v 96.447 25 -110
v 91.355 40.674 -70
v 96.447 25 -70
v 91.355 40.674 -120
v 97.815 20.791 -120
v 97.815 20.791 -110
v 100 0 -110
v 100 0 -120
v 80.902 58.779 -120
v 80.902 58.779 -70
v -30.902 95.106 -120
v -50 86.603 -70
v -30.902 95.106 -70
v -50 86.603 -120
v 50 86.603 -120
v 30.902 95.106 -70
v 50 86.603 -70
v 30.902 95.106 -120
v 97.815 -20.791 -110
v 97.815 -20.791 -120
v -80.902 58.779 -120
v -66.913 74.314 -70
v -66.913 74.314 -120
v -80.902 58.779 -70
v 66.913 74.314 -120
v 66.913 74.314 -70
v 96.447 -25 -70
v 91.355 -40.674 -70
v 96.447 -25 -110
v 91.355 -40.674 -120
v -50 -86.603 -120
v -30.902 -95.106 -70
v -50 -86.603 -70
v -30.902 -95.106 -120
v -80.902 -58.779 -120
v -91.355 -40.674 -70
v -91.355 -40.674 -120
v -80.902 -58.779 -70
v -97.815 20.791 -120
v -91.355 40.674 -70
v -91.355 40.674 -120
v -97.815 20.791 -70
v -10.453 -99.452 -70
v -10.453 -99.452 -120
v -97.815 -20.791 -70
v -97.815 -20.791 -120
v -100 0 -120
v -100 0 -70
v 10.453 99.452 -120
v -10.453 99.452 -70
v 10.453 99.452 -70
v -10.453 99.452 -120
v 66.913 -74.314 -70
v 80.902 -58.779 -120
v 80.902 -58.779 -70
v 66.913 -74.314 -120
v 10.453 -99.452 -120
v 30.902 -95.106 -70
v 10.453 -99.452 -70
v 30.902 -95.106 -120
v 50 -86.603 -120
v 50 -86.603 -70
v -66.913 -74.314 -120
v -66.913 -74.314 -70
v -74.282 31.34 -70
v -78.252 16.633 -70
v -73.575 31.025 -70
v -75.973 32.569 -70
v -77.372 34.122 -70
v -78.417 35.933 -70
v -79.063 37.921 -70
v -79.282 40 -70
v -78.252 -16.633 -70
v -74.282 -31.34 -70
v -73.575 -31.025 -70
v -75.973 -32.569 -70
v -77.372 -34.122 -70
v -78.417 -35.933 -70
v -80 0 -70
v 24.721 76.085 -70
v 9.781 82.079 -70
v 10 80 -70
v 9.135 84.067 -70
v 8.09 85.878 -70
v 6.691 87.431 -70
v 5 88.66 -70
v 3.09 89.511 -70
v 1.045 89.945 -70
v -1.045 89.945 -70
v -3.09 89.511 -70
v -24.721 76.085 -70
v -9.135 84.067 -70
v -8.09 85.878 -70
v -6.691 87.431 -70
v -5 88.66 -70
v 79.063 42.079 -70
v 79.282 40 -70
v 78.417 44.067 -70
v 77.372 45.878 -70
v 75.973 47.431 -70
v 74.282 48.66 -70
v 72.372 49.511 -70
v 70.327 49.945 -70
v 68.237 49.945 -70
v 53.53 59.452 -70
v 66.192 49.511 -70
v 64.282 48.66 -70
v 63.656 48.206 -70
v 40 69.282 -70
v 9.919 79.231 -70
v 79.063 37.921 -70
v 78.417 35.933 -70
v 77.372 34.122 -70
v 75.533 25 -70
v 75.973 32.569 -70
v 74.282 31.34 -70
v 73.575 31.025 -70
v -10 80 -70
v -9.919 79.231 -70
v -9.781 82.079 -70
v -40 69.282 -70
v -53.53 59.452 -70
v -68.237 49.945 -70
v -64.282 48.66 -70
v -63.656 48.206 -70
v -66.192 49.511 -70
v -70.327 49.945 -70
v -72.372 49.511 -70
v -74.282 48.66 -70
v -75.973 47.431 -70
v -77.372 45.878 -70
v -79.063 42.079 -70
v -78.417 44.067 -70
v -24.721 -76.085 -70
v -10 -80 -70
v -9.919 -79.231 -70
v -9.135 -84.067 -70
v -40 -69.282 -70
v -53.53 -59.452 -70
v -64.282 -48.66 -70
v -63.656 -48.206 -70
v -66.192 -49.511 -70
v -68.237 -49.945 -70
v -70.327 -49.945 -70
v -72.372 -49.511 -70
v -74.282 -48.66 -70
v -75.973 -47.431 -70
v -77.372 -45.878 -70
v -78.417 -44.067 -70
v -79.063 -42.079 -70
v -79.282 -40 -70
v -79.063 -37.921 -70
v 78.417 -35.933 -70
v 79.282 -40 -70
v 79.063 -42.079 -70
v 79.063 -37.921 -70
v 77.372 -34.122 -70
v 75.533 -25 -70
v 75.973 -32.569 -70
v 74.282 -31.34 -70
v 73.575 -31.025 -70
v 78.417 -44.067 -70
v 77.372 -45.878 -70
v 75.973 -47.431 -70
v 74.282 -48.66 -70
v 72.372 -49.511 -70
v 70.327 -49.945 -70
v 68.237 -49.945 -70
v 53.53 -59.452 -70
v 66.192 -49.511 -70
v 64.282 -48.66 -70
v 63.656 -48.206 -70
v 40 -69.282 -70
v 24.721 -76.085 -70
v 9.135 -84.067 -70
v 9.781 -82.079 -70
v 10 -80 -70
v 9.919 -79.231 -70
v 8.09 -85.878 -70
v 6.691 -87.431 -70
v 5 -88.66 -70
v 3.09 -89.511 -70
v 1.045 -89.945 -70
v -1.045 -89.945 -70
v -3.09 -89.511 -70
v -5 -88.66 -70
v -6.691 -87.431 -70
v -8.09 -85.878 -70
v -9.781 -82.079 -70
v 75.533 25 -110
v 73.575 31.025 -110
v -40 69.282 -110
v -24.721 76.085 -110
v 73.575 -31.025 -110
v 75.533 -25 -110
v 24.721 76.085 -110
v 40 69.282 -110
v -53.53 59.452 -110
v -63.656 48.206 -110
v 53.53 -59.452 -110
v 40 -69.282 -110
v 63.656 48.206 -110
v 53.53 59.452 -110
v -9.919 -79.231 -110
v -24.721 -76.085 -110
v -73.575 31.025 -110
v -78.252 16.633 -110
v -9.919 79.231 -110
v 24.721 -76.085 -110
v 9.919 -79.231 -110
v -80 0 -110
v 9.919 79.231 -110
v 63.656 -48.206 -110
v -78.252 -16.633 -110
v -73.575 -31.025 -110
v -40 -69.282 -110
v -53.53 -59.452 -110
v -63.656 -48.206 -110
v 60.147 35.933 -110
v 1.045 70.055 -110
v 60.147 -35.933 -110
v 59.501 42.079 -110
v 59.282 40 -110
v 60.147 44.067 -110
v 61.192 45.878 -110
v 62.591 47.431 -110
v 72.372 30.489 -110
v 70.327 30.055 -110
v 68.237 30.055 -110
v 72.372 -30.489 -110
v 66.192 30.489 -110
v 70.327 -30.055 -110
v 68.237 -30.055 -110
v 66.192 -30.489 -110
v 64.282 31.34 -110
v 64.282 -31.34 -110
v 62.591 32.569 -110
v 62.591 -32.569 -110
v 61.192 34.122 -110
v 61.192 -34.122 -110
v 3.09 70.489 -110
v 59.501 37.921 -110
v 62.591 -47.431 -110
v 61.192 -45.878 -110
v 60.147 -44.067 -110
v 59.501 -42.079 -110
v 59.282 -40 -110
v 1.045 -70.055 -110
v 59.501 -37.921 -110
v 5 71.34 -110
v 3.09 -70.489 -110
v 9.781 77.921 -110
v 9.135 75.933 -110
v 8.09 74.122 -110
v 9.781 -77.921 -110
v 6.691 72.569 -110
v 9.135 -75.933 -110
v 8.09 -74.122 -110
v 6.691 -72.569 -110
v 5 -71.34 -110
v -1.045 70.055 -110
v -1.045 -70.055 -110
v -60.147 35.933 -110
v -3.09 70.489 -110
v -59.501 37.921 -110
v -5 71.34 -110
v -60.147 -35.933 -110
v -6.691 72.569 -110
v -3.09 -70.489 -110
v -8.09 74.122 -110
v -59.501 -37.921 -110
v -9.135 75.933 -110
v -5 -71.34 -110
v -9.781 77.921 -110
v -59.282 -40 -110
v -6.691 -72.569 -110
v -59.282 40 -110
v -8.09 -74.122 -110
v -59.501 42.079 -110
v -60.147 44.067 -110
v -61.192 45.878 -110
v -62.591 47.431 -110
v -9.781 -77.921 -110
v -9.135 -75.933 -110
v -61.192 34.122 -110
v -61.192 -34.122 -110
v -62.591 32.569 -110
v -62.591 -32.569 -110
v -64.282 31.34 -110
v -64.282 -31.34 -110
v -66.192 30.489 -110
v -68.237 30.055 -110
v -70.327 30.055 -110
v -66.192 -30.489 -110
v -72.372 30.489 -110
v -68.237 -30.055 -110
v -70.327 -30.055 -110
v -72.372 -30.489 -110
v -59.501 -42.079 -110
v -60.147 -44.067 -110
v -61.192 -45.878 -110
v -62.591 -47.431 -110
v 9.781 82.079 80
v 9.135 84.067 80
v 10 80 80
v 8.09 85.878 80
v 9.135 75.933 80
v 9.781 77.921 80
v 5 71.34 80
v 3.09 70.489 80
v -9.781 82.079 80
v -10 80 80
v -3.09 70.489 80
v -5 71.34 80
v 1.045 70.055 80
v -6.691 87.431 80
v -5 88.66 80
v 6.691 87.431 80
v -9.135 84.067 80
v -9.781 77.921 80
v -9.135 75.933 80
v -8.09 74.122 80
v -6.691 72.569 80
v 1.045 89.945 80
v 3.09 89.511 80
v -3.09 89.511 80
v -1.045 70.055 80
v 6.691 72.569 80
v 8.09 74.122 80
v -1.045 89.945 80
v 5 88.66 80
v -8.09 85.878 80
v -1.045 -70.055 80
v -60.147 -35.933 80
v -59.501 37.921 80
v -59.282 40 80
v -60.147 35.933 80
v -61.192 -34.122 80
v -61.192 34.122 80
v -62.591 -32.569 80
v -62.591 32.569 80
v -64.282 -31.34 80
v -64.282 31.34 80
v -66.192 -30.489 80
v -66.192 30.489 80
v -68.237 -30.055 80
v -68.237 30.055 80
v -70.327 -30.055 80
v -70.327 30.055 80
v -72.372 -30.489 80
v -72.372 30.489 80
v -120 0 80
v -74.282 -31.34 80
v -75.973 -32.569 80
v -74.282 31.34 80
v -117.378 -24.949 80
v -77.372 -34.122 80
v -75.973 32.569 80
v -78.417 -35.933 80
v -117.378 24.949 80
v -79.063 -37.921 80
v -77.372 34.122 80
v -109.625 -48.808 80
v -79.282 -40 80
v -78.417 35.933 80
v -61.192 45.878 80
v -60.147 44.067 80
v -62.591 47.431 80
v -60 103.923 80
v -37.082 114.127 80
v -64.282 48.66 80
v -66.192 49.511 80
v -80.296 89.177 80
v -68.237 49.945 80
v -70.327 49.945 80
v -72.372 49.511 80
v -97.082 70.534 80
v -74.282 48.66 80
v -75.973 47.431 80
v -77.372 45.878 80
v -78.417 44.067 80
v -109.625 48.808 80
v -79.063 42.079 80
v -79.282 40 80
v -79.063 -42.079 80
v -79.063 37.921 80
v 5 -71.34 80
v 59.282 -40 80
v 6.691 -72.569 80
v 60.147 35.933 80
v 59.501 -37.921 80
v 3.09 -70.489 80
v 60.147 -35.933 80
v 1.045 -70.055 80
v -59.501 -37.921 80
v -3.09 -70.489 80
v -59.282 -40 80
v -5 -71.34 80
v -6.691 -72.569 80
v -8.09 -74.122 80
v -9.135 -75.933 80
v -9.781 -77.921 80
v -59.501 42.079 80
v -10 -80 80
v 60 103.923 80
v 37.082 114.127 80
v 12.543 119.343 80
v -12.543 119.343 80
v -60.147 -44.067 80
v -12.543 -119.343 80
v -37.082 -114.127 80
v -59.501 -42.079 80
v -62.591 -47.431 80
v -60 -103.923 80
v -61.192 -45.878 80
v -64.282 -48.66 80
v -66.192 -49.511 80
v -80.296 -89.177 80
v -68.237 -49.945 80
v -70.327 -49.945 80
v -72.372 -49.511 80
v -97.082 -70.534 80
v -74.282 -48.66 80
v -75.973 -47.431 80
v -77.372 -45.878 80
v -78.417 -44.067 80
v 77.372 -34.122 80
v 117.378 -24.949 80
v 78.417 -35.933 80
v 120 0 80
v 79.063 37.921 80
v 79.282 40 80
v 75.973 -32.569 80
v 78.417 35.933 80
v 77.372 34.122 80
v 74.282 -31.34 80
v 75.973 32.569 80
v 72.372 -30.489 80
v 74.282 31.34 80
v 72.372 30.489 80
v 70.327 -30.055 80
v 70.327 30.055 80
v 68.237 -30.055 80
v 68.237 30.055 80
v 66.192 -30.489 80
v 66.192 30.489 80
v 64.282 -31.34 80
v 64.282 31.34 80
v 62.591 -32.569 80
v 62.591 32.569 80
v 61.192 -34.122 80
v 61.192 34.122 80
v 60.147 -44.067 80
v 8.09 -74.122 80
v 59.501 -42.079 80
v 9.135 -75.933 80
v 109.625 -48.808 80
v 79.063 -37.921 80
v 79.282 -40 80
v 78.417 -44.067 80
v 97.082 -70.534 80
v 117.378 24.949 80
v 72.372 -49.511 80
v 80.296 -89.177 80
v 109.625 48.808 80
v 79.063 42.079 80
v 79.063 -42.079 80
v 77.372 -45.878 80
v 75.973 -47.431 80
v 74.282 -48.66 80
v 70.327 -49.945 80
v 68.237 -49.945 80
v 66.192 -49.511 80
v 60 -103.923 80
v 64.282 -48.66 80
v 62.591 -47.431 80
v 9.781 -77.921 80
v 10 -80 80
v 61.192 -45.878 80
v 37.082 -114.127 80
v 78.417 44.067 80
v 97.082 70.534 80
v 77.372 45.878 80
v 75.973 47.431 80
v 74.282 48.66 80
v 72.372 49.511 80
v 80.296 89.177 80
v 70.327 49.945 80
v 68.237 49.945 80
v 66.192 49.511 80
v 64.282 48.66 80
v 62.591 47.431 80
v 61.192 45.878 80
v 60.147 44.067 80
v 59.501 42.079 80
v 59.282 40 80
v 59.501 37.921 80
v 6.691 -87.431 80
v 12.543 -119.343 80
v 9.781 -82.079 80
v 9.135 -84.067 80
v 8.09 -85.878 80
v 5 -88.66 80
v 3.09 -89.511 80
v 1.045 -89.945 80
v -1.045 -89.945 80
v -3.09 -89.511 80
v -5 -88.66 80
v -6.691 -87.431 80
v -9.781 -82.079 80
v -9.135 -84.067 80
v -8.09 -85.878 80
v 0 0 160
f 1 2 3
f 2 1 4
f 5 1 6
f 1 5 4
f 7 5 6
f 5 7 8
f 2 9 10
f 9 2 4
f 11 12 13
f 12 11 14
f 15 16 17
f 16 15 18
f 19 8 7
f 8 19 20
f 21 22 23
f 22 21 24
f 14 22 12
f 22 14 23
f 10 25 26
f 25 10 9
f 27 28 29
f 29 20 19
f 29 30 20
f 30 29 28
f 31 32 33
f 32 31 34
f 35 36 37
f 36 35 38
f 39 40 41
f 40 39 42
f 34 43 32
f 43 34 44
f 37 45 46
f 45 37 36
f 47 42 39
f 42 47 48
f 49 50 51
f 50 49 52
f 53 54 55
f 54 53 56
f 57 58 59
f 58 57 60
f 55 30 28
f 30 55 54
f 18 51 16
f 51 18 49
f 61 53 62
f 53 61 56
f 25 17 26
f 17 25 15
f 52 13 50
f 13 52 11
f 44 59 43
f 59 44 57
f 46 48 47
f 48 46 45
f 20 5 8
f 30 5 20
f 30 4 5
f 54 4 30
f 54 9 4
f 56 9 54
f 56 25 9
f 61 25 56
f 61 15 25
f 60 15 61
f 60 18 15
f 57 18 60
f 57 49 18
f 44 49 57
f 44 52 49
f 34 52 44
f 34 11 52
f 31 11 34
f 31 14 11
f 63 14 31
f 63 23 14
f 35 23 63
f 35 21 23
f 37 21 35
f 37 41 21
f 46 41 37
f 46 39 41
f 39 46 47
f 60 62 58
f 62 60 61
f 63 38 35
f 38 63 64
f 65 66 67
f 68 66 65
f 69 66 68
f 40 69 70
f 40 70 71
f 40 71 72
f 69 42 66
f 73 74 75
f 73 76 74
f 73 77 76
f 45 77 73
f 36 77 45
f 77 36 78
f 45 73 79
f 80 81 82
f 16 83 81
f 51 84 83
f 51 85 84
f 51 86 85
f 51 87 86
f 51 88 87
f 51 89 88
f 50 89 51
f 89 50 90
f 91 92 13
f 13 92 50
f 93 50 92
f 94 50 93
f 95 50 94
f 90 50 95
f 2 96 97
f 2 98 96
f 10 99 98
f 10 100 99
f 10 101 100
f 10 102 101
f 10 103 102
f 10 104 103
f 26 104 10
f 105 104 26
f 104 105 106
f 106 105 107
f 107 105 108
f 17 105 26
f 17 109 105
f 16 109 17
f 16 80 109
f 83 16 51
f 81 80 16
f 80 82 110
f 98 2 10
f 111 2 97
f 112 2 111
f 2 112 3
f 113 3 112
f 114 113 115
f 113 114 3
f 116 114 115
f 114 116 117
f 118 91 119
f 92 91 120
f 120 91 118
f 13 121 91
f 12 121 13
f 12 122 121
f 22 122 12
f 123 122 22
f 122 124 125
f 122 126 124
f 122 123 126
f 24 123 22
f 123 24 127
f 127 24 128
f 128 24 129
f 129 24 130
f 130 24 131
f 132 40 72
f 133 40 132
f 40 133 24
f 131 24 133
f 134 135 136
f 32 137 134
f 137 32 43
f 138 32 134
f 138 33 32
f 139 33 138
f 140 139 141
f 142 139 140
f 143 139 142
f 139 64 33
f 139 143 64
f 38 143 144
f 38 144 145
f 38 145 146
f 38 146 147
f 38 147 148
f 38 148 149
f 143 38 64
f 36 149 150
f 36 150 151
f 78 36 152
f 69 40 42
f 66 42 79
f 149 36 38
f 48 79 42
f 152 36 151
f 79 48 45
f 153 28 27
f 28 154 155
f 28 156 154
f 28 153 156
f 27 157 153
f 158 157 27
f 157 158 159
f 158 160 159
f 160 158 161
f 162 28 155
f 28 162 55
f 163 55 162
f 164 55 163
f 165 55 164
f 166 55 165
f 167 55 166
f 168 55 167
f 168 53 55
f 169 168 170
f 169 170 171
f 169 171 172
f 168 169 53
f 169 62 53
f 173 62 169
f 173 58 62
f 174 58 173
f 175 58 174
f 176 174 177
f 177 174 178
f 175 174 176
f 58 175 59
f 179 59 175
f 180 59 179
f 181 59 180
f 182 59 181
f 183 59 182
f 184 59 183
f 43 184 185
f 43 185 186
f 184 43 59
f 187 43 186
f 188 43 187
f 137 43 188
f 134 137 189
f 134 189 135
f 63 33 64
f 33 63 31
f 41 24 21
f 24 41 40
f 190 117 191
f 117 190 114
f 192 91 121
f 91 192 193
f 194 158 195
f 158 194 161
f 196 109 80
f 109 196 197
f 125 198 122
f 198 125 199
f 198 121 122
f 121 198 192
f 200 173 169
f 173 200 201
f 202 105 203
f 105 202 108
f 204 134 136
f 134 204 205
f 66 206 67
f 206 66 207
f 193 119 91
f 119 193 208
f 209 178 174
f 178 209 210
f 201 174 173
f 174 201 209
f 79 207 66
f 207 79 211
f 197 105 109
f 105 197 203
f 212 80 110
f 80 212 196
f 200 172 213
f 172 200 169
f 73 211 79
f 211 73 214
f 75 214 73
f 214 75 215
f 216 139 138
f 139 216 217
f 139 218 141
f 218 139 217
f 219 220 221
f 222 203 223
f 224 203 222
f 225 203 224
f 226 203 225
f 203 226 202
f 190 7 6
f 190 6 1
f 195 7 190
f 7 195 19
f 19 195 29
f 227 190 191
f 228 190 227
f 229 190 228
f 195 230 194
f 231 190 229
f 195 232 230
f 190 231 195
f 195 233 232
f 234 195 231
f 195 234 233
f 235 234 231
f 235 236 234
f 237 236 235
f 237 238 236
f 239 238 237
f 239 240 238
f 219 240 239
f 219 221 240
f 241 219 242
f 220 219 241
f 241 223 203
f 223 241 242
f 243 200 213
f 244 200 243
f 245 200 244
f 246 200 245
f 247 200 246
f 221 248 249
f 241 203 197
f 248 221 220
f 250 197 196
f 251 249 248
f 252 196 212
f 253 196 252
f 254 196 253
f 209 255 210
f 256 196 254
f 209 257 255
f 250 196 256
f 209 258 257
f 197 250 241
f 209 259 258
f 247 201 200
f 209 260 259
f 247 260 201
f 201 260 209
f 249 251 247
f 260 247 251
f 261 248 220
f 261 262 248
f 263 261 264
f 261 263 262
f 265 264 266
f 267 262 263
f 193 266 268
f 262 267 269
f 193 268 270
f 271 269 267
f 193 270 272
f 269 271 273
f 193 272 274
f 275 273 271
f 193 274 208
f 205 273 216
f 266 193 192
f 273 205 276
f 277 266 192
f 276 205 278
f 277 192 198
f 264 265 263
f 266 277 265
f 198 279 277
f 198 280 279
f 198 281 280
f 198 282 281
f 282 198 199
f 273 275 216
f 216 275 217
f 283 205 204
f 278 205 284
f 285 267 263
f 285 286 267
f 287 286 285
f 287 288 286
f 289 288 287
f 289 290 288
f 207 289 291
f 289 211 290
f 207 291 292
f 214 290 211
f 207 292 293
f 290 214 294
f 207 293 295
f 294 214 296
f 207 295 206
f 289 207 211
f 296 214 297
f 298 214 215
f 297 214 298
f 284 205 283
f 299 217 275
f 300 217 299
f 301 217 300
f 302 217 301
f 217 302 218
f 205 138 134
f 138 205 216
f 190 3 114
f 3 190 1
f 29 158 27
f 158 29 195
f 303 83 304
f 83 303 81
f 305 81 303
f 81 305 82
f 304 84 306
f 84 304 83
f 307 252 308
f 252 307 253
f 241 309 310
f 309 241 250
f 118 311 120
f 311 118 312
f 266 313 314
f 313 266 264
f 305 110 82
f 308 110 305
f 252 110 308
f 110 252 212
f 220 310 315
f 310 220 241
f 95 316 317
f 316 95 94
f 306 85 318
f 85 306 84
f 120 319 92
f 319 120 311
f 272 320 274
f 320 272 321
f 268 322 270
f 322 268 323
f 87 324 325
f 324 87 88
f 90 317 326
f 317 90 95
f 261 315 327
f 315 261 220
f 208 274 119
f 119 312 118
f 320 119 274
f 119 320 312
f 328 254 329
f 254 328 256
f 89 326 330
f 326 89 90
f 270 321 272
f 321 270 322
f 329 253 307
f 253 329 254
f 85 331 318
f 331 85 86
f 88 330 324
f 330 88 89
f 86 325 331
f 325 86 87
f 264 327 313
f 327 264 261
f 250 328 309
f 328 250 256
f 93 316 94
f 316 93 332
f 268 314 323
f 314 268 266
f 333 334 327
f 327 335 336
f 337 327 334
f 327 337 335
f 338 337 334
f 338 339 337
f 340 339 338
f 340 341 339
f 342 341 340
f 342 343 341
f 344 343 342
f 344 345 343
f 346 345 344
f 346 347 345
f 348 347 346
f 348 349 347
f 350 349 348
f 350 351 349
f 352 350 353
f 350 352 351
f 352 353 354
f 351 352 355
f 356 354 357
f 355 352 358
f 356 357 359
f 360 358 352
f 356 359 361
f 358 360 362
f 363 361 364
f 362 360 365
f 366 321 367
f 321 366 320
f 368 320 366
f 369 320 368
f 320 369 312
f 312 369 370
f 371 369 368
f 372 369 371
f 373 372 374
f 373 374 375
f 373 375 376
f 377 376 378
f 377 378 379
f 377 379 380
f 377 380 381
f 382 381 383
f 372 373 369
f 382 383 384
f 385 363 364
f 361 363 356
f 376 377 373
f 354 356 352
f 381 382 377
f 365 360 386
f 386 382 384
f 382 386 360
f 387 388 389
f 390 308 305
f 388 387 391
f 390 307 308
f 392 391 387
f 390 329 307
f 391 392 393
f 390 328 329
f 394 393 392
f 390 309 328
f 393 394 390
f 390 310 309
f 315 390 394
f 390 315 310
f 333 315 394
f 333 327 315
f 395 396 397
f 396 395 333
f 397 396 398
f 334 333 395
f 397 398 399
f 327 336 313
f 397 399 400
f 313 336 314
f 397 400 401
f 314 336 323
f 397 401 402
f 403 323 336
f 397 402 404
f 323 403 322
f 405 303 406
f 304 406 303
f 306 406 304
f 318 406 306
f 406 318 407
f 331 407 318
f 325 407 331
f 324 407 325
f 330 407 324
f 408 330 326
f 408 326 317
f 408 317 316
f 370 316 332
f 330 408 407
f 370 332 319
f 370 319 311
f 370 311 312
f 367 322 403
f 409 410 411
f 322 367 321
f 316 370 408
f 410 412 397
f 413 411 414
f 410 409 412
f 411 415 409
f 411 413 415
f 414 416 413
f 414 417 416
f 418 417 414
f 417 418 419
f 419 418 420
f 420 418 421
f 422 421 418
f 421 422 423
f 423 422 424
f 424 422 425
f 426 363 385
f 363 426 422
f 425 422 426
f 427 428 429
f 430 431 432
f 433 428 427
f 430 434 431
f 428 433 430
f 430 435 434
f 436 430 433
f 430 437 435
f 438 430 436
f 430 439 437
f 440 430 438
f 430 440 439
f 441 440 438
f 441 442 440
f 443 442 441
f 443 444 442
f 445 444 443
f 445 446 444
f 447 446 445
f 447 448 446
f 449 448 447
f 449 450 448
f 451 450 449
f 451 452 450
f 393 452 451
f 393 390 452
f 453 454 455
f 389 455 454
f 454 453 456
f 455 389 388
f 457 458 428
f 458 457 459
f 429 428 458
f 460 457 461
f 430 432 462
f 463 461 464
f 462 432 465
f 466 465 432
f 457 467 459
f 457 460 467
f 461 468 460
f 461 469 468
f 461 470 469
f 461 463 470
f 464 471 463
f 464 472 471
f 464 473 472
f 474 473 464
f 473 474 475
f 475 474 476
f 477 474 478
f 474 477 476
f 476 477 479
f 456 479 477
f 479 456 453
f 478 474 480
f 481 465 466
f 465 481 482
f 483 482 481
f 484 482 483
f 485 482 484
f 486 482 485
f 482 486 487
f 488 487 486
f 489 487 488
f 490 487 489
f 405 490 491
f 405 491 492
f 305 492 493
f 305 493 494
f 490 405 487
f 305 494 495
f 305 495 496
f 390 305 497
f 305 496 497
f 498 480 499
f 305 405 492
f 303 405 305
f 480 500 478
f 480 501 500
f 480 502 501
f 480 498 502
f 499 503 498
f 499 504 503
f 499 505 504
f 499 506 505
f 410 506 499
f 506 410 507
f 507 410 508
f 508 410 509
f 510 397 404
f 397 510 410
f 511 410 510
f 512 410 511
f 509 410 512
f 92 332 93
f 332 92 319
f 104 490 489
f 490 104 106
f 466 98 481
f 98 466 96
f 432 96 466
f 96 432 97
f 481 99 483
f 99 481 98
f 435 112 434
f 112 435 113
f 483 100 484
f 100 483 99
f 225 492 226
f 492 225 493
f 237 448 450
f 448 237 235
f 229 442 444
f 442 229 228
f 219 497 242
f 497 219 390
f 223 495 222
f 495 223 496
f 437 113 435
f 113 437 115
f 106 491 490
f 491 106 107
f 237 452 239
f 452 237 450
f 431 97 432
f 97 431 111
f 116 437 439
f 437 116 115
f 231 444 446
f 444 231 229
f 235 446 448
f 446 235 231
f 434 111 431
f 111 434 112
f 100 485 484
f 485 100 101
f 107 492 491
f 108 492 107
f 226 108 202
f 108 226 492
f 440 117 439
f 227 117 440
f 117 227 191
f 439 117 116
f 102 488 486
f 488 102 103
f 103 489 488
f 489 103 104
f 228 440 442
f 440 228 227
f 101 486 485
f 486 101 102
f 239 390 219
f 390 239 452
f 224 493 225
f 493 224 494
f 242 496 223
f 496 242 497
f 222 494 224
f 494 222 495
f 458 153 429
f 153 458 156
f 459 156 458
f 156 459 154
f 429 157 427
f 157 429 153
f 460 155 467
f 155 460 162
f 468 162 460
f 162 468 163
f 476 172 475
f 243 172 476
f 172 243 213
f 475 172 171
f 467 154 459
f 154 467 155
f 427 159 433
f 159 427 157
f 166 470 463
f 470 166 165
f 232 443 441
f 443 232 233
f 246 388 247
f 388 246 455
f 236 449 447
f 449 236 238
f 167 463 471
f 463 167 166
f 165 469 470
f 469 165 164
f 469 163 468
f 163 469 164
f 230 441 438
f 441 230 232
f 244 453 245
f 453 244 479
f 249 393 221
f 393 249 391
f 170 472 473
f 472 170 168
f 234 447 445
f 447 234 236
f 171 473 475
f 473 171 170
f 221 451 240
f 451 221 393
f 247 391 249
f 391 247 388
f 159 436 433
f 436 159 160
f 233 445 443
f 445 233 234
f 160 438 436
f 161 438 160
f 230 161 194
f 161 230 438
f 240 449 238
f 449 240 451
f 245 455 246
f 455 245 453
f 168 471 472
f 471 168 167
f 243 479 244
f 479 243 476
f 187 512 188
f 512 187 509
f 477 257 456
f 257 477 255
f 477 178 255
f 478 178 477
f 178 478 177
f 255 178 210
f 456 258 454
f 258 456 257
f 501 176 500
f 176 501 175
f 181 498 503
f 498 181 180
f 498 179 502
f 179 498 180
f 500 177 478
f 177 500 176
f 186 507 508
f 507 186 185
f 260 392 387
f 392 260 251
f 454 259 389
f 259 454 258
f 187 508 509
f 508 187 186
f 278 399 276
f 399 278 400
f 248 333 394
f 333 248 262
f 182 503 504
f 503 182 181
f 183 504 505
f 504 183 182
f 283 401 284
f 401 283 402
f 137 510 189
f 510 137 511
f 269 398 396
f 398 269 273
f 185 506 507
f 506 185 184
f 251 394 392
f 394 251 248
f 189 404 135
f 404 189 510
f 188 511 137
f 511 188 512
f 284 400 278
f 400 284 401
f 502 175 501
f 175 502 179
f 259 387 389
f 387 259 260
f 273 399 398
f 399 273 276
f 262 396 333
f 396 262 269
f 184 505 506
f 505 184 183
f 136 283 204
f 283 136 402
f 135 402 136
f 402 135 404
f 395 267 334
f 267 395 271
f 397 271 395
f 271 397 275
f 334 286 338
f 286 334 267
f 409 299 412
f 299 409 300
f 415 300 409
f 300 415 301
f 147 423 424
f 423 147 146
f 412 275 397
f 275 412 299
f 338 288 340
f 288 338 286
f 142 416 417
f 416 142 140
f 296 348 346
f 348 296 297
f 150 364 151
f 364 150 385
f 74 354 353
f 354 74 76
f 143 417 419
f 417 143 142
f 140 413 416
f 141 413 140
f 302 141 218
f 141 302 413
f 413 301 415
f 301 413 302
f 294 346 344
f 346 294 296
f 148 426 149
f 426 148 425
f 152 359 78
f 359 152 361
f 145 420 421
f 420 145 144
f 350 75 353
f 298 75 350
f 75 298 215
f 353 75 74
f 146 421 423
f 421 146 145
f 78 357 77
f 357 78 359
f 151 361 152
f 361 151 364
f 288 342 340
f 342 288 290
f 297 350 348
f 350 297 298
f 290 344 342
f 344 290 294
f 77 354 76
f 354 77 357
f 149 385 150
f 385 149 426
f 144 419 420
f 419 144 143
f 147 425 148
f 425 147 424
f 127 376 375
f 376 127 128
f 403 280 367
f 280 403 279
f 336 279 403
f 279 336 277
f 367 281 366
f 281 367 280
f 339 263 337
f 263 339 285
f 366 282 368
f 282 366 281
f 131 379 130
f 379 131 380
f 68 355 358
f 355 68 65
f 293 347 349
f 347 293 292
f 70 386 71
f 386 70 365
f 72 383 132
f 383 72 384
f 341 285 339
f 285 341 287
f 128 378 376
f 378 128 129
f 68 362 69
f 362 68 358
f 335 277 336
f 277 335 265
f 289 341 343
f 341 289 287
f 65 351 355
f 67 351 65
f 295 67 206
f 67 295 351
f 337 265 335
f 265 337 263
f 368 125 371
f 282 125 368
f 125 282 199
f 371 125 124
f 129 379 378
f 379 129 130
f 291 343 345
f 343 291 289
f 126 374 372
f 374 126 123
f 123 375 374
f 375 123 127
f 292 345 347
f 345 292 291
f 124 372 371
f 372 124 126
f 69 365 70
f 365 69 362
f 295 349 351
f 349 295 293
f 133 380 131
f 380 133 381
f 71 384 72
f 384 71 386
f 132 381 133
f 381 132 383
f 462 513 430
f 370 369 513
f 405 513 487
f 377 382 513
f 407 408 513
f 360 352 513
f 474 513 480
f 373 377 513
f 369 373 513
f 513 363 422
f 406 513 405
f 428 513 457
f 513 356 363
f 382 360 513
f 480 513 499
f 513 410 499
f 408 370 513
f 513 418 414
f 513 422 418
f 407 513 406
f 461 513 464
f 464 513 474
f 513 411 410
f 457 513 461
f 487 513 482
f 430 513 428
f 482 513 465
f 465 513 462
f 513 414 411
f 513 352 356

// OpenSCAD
//created with rubyscad 1.0

translate(v = [0.000, 0.000, -120]) {
   difference() {
      cylinder(h = 50, r = 100); 
      translate(v = [0.000, 0.000, 10]) 
      cylinder(h = 50, r = 80); 
      translate(v = [100, 0, 35]) 
      cube(size = 50, center = true); 
   }
   echo(0, 0.000, 80.000);
   translate(v = [0.000, 80.000, 0]) 
   cylinder(h = 200, r = 10); 
   echo(60, 69.282, 40.000);
   translate(v = [69.282, 40.000, 0]) 
   cylinder(h = 200, r = 10); 
   echo(120, 69.282, -40.000);
   translate(v = [69.282, -40.000, 0]) 
   cylinder(h = 200, r = 10); 
   echo(180, 0.000, -80.000);
   translate(v = [0.000, -80.000, 0]) 
   cylinder(h = 200, r = 10); 
   echo(240, -69.282, -40.000);
   translate(v = [-69.282, -40.000, 0]) 
   cylinder(h = 200, r = 10); 
   echo(300, -69.282, 40.000);
   translate(v = [-69.282, 40.000, 0]) 
   cylinder(h = 200, r = 10); 
   translate(v = [0.000, 0.000, 200]) 
   cylinder(h = 80, r1 = 120, r2 = 0); 
}
